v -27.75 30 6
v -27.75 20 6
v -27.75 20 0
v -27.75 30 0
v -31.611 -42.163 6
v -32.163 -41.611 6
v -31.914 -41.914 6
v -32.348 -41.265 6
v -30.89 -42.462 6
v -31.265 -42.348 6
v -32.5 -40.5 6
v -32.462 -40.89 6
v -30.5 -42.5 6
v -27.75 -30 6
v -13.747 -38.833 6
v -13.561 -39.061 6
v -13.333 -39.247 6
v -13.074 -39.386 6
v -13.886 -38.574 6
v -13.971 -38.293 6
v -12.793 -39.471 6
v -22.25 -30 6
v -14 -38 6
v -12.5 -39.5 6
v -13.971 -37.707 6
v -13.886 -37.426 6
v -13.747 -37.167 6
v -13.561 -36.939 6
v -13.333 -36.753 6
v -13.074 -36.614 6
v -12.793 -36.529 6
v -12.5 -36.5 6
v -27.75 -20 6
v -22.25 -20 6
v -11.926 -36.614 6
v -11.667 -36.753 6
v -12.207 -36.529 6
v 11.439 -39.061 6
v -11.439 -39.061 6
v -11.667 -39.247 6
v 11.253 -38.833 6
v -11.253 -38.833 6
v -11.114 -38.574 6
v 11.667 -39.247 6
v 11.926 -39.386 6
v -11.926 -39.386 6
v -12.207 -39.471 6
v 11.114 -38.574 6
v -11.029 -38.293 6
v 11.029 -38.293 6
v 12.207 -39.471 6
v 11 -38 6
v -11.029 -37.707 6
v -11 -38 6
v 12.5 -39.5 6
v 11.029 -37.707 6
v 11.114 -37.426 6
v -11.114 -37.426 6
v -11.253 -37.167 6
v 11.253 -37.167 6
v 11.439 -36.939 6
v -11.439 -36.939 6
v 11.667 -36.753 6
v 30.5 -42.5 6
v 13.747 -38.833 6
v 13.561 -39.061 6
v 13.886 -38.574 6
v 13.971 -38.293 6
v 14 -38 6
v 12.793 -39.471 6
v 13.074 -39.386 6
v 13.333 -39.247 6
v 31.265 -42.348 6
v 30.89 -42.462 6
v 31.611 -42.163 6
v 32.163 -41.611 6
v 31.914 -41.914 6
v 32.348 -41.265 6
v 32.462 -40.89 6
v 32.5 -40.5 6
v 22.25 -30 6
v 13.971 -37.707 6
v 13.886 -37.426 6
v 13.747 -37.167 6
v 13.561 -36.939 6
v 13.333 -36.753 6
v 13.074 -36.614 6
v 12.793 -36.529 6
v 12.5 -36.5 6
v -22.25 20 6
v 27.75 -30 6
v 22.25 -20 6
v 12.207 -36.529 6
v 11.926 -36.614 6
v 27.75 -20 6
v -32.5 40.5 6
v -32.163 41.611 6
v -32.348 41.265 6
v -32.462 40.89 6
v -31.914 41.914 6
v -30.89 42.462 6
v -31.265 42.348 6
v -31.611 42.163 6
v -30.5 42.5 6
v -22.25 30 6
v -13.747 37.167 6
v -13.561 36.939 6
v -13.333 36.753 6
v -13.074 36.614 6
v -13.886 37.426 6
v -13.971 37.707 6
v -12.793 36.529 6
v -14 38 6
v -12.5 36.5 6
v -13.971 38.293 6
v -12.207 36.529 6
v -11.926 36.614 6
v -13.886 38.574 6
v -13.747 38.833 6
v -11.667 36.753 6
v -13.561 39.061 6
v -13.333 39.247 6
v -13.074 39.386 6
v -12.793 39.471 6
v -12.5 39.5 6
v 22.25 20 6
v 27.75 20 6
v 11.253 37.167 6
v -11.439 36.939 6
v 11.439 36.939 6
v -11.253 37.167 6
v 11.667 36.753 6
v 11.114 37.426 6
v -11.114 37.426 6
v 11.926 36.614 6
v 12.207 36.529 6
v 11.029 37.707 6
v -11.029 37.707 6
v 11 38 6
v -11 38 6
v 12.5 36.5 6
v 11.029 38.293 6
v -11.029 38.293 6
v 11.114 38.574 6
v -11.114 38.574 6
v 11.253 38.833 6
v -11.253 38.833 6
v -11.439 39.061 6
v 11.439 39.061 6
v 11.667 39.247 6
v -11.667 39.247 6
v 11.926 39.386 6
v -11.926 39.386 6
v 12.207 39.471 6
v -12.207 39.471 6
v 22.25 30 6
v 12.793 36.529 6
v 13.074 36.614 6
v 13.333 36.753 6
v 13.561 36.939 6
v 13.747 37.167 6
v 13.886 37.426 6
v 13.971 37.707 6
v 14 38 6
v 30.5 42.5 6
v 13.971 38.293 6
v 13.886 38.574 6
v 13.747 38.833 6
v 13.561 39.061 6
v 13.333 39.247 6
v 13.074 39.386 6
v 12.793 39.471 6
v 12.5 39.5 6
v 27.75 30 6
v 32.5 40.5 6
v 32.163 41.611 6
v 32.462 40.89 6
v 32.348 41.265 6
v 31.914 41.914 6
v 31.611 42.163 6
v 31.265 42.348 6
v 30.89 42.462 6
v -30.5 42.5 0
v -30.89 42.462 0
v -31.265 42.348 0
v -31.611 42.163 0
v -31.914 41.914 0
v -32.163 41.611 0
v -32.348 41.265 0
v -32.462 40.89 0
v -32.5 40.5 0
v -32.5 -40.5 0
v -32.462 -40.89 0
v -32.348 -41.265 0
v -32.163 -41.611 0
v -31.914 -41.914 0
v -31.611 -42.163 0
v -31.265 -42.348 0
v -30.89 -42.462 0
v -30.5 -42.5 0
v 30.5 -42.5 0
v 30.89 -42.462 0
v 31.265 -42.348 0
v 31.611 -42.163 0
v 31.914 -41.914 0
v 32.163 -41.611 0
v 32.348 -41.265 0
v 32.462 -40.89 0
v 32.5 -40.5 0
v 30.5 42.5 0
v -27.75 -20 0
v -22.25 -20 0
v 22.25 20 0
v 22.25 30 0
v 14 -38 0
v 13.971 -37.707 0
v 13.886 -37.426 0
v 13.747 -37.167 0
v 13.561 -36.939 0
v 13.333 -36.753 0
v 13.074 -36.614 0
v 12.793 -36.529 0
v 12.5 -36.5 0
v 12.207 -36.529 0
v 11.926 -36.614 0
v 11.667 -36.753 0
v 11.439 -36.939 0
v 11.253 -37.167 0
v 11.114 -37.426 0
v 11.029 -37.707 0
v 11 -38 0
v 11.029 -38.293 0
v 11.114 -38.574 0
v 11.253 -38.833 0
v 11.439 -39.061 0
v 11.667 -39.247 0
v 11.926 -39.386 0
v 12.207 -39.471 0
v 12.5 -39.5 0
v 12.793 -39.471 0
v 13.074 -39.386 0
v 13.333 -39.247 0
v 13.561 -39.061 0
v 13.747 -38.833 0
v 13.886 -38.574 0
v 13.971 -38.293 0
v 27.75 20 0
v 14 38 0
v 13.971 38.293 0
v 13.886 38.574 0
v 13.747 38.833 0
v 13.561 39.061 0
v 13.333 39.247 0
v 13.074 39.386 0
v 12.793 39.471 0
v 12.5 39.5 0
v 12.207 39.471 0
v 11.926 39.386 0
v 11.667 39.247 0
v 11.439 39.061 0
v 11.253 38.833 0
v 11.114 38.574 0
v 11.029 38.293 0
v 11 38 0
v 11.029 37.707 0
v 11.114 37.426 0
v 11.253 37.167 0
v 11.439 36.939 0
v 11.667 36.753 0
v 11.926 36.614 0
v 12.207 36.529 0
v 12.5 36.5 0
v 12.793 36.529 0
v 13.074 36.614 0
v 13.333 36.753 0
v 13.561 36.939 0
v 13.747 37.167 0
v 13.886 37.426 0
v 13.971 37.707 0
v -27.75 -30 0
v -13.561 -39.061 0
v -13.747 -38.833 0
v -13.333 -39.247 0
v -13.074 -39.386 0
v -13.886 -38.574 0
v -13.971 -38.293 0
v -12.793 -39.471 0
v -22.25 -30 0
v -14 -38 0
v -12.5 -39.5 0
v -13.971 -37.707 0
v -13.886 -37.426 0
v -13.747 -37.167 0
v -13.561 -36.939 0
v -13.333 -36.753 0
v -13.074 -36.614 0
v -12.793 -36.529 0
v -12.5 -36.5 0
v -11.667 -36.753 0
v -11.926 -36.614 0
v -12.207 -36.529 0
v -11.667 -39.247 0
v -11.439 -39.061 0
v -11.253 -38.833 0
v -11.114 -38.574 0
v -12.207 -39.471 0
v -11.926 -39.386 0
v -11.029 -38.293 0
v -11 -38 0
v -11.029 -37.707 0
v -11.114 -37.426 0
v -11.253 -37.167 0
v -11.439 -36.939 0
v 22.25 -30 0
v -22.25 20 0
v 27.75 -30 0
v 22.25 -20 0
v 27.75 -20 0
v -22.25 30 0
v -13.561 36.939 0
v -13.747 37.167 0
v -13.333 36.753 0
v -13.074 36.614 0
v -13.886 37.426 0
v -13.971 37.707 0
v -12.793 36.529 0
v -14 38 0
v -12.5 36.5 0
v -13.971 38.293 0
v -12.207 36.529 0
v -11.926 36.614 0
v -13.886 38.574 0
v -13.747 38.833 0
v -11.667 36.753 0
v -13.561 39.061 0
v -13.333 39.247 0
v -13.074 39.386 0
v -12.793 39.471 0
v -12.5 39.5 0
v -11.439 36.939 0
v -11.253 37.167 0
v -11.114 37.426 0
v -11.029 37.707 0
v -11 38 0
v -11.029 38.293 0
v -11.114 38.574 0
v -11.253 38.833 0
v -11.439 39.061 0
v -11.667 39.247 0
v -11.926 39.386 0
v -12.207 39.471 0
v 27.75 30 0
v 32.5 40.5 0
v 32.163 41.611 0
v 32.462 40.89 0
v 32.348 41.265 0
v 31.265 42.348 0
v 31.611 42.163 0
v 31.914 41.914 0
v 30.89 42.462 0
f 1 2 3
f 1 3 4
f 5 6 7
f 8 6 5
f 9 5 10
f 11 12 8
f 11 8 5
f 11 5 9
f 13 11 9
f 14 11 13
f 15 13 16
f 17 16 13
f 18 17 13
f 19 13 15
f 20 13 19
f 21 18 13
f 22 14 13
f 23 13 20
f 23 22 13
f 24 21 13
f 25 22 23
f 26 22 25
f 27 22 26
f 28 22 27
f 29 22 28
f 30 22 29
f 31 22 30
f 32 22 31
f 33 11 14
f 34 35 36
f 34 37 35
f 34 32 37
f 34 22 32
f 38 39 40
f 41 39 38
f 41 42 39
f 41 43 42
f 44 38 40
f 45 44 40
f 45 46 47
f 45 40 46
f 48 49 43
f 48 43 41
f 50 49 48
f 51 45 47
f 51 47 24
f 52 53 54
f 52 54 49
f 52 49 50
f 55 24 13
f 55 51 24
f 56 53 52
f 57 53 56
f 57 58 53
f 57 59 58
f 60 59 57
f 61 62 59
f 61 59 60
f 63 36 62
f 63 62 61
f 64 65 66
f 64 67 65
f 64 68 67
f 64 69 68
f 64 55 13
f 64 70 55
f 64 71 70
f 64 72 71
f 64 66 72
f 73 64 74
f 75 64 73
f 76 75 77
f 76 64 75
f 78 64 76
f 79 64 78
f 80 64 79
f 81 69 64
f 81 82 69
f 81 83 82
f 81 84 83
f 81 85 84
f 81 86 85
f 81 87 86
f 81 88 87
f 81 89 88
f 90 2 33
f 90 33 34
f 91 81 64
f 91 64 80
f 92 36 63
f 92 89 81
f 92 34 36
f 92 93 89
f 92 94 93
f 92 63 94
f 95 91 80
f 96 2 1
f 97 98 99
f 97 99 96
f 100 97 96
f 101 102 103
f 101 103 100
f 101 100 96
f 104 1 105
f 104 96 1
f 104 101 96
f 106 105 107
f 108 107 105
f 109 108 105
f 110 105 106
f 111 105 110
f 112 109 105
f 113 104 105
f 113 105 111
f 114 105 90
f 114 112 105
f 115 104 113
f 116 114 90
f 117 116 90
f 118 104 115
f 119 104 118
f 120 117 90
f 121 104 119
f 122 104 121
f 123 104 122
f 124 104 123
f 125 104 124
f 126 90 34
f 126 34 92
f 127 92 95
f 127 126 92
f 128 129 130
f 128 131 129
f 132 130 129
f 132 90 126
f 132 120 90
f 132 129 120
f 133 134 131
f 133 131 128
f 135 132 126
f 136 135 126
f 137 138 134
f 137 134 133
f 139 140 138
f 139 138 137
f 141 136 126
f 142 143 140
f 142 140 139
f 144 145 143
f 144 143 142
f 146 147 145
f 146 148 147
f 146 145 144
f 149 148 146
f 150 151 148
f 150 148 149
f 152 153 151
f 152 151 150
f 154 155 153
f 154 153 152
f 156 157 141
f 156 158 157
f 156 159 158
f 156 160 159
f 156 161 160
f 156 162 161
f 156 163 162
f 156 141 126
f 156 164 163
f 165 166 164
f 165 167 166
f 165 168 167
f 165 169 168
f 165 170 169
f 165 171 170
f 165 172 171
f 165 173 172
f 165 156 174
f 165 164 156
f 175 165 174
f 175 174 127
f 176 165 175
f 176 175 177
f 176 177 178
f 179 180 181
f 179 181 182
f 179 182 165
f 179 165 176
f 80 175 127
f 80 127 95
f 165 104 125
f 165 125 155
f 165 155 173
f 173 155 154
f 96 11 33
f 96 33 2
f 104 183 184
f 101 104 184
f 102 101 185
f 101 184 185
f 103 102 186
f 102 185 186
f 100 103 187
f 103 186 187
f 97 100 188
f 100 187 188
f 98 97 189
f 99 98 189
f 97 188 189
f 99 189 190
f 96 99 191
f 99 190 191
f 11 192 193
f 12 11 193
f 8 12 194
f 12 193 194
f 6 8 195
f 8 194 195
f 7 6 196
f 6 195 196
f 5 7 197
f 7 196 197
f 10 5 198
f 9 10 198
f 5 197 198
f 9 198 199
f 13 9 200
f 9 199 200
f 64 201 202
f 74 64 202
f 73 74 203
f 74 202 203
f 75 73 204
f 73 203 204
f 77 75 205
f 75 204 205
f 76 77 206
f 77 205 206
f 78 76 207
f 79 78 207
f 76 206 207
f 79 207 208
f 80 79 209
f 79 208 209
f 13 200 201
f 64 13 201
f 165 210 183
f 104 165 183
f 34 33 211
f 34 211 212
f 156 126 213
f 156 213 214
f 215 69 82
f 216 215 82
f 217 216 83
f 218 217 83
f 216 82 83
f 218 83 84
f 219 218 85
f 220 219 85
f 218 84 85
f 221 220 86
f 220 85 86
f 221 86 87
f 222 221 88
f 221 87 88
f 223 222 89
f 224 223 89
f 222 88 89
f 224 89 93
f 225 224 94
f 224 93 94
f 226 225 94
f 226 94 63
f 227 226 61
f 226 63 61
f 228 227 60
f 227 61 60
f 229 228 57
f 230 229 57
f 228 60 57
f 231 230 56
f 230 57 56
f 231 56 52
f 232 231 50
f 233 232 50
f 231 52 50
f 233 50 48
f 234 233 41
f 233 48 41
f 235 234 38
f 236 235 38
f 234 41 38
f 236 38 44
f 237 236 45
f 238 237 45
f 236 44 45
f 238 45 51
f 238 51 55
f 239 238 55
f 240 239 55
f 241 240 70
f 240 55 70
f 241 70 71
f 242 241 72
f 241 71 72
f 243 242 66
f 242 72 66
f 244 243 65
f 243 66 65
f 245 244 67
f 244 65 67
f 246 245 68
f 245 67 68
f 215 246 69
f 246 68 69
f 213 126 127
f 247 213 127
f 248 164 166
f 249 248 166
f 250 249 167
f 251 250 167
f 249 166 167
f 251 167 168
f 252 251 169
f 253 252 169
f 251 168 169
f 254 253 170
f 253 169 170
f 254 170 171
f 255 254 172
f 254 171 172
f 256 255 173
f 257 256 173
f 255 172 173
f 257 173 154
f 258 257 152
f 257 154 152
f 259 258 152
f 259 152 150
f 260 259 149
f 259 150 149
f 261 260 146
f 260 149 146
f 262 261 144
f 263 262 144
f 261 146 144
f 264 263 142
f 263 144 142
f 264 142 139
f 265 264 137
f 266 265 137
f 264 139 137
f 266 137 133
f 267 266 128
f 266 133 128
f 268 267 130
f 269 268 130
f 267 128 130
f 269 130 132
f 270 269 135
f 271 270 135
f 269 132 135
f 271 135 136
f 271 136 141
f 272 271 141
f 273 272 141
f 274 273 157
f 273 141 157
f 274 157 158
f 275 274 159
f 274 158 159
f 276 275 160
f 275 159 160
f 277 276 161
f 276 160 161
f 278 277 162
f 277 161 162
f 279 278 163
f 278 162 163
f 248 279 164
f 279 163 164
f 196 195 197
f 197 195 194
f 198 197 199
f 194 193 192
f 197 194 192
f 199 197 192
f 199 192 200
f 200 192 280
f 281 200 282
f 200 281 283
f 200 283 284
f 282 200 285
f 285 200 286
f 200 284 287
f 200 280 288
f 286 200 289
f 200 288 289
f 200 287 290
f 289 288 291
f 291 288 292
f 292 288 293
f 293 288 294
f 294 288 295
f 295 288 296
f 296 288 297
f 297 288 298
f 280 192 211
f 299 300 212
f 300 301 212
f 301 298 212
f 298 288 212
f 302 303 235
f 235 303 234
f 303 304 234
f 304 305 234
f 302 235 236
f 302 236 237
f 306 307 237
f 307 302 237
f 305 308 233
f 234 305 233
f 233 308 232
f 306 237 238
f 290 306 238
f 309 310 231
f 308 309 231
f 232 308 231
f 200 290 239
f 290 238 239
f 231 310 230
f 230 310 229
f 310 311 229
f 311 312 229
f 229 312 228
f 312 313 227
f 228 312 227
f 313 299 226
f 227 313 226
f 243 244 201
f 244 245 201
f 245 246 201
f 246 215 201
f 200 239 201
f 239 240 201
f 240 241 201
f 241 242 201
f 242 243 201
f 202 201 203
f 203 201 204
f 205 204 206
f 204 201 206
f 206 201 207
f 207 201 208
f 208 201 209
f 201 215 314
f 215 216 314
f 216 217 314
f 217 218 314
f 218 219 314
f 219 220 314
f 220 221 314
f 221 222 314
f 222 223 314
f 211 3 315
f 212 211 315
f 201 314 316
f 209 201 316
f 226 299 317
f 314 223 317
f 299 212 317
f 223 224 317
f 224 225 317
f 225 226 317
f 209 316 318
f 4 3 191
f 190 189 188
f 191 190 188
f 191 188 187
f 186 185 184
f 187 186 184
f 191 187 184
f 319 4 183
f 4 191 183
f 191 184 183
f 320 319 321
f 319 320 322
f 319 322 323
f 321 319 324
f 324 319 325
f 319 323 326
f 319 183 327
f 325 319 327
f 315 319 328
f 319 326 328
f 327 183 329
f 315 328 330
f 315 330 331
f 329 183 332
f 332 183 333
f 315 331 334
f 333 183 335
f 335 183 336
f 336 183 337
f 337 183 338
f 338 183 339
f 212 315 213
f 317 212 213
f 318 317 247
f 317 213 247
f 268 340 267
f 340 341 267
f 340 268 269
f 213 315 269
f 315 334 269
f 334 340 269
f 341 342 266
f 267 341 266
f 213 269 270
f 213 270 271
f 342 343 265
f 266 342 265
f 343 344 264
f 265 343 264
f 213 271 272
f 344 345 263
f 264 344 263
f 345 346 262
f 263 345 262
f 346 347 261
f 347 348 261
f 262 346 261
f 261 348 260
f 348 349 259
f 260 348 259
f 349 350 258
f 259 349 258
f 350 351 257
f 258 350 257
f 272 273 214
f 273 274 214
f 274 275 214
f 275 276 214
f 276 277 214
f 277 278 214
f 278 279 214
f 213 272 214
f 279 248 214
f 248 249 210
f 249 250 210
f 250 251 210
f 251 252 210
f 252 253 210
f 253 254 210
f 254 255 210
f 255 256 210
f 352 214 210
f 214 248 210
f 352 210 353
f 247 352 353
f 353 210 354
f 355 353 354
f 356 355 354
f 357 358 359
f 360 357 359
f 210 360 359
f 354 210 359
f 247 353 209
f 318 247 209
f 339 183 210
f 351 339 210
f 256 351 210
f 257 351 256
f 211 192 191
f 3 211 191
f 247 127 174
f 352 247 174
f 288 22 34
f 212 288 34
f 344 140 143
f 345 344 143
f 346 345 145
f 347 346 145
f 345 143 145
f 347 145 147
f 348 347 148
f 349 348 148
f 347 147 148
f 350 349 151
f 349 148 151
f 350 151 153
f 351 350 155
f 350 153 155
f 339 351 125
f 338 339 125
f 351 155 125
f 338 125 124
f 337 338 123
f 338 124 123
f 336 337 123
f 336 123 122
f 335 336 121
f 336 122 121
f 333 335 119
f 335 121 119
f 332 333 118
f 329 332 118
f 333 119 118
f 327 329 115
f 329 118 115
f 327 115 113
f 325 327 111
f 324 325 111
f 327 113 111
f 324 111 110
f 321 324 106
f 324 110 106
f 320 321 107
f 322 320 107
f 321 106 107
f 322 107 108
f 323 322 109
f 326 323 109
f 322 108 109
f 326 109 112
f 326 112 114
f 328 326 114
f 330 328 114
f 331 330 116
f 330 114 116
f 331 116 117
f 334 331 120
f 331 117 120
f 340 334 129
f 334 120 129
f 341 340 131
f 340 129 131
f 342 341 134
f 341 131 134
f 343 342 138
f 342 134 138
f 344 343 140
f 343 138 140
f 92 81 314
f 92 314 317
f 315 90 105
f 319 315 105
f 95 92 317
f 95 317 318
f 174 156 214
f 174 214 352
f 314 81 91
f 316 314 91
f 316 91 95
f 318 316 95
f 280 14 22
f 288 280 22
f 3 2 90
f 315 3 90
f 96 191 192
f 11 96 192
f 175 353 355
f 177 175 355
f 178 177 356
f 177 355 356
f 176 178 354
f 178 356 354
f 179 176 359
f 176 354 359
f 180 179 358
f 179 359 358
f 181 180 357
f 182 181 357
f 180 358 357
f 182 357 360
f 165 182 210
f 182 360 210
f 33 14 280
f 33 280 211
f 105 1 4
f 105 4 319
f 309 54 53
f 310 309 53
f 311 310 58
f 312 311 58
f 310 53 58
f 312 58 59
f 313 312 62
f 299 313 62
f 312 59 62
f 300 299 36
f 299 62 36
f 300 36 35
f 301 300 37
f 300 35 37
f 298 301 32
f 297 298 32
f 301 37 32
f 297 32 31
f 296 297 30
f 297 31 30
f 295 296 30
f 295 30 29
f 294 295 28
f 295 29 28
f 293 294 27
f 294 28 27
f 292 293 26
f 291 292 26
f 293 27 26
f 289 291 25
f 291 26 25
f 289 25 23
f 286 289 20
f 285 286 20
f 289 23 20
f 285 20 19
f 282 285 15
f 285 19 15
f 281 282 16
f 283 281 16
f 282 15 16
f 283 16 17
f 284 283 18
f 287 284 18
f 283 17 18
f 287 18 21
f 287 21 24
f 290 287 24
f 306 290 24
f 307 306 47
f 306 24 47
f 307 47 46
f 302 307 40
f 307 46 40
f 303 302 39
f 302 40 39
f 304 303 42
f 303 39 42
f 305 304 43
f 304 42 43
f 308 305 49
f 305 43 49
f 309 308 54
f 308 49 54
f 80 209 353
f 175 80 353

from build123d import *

# Parameters (mm, degrees)
F1_DEPTH = 6
F2_W     = 5.5
F2_H     = 10
F3_DEPTH = 25
F4_R     = 1.5
F5_DEPTH = 6


with BuildPart() as f1:
    # F0 (on Top) → F1 (new body)
    with BuildSketch(Plane.XY):
        with BuildLine():
            Line((-30.5, -42.5), (30.5, -42.5))
            ThreePointArc((30.5, -42.5), (31.914214, -41.914214), (32.5, -40.5))
            Line((32.5, -40.5), (32.5, 40.5))
            ThreePointArc((32.5, 40.5), (31.914214, 41.914214), (30.5, 42.5))
            Line((30.5, 42.5), (-30.5, 42.5))
            ThreePointArc((-30.5, 42.5), (-31.914214, 41.914214), (-32.5, 40.5))
            Line((-32.5, 40.5), (-32.5, -40.5))
            ThreePointArc((-32.5, -40.5), (-31.914214, -41.914214), (-30.5, -42.5))
        make_face()
    extrude(amount=F1_DEPTH)

    # F2 (on face) → F3 (cut)
    with BuildSketch(Plane.XY.offset(6)):
        with Locations((-25, 25)):
            Rectangle(F2_W, F2_H)
        with Locations((25, 25)):
            Rectangle(F2_W, F2_H)
        with Locations((25, -25)):
            Rectangle(F2_W, F2_H)
        with Locations((-25, -25)):
            Rectangle(F2_W, F2_H)
    extrude(amount=-F3_DEPTH, mode=Mode.SUBTRACT)

    # F4 (on face) → F5 (cut)
    with BuildSketch(Plane.XY.offset(6)):
        with Locations((-12.5, 38)):
            Circle(F4_R)
        with Locations((12.5, 38)):
            Circle(F4_R)
        with Locations((12.5, -38)):
            Circle(F4_R)
        with Locations((-12.5, -38)):
            Circle(F4_R)
    extrude(amount=-F5_DEPTH, mode=Mode.SUBTRACT)


solid = f1.part
